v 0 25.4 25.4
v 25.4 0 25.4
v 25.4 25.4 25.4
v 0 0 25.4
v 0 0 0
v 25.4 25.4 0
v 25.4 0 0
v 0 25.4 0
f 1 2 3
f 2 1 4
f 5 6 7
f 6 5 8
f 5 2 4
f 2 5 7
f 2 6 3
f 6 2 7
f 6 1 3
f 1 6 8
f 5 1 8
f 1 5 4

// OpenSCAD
// file: defs.scad
JointVertSpace=30;
LayerUnit=100;
SpacedLayer=LayerUnit+JointVertSpace;
JointR = 400;
ShaftR = 200;
ShaftHole=230;
ShaftTight=205;
HexTight=210;
MagicMult = 50;

// Spine Horizontal
MagicA = MagicMult * 38;
// Spine Verticial
MagicL = MagicMult * 7.8;

// Leg Triangle
MagicG = MagicMult * 36.7; // a
MagicH = MagicMult * 65.7; // c
MagicI = MagicMult * 49;   // b

// Driver Triangle
MagicB = MagicMult * 41.5;
MagicD = MagicMult * 40.1;
MagicE = MagicMult * 55.8;

// Front Strut
MagicC = MagicMult * 39.3;
FsLen = MagicC;

// Back Strut
MagicF = MagicMult * 39.4;
BsLen = MagicF;

// Lower Driver Strut
MagicK = MagicMult * 61.9;

// Upper Driver Strut
MagicJ = MagicMult * 50;

// Cam radius
MagicM = MagicMult * 15;

spineLength = sqrt(pow(MagicA, 2) + pow(MagicL,2));
// main file
include <defs.scad>
RealityScale = 1.27;
ViewScale=[.02*RealityScale,.02*RealityScale,.02*RealityScale];

scale(ViewScale)
{
    cube([1000, 1000, 1000]);
}
